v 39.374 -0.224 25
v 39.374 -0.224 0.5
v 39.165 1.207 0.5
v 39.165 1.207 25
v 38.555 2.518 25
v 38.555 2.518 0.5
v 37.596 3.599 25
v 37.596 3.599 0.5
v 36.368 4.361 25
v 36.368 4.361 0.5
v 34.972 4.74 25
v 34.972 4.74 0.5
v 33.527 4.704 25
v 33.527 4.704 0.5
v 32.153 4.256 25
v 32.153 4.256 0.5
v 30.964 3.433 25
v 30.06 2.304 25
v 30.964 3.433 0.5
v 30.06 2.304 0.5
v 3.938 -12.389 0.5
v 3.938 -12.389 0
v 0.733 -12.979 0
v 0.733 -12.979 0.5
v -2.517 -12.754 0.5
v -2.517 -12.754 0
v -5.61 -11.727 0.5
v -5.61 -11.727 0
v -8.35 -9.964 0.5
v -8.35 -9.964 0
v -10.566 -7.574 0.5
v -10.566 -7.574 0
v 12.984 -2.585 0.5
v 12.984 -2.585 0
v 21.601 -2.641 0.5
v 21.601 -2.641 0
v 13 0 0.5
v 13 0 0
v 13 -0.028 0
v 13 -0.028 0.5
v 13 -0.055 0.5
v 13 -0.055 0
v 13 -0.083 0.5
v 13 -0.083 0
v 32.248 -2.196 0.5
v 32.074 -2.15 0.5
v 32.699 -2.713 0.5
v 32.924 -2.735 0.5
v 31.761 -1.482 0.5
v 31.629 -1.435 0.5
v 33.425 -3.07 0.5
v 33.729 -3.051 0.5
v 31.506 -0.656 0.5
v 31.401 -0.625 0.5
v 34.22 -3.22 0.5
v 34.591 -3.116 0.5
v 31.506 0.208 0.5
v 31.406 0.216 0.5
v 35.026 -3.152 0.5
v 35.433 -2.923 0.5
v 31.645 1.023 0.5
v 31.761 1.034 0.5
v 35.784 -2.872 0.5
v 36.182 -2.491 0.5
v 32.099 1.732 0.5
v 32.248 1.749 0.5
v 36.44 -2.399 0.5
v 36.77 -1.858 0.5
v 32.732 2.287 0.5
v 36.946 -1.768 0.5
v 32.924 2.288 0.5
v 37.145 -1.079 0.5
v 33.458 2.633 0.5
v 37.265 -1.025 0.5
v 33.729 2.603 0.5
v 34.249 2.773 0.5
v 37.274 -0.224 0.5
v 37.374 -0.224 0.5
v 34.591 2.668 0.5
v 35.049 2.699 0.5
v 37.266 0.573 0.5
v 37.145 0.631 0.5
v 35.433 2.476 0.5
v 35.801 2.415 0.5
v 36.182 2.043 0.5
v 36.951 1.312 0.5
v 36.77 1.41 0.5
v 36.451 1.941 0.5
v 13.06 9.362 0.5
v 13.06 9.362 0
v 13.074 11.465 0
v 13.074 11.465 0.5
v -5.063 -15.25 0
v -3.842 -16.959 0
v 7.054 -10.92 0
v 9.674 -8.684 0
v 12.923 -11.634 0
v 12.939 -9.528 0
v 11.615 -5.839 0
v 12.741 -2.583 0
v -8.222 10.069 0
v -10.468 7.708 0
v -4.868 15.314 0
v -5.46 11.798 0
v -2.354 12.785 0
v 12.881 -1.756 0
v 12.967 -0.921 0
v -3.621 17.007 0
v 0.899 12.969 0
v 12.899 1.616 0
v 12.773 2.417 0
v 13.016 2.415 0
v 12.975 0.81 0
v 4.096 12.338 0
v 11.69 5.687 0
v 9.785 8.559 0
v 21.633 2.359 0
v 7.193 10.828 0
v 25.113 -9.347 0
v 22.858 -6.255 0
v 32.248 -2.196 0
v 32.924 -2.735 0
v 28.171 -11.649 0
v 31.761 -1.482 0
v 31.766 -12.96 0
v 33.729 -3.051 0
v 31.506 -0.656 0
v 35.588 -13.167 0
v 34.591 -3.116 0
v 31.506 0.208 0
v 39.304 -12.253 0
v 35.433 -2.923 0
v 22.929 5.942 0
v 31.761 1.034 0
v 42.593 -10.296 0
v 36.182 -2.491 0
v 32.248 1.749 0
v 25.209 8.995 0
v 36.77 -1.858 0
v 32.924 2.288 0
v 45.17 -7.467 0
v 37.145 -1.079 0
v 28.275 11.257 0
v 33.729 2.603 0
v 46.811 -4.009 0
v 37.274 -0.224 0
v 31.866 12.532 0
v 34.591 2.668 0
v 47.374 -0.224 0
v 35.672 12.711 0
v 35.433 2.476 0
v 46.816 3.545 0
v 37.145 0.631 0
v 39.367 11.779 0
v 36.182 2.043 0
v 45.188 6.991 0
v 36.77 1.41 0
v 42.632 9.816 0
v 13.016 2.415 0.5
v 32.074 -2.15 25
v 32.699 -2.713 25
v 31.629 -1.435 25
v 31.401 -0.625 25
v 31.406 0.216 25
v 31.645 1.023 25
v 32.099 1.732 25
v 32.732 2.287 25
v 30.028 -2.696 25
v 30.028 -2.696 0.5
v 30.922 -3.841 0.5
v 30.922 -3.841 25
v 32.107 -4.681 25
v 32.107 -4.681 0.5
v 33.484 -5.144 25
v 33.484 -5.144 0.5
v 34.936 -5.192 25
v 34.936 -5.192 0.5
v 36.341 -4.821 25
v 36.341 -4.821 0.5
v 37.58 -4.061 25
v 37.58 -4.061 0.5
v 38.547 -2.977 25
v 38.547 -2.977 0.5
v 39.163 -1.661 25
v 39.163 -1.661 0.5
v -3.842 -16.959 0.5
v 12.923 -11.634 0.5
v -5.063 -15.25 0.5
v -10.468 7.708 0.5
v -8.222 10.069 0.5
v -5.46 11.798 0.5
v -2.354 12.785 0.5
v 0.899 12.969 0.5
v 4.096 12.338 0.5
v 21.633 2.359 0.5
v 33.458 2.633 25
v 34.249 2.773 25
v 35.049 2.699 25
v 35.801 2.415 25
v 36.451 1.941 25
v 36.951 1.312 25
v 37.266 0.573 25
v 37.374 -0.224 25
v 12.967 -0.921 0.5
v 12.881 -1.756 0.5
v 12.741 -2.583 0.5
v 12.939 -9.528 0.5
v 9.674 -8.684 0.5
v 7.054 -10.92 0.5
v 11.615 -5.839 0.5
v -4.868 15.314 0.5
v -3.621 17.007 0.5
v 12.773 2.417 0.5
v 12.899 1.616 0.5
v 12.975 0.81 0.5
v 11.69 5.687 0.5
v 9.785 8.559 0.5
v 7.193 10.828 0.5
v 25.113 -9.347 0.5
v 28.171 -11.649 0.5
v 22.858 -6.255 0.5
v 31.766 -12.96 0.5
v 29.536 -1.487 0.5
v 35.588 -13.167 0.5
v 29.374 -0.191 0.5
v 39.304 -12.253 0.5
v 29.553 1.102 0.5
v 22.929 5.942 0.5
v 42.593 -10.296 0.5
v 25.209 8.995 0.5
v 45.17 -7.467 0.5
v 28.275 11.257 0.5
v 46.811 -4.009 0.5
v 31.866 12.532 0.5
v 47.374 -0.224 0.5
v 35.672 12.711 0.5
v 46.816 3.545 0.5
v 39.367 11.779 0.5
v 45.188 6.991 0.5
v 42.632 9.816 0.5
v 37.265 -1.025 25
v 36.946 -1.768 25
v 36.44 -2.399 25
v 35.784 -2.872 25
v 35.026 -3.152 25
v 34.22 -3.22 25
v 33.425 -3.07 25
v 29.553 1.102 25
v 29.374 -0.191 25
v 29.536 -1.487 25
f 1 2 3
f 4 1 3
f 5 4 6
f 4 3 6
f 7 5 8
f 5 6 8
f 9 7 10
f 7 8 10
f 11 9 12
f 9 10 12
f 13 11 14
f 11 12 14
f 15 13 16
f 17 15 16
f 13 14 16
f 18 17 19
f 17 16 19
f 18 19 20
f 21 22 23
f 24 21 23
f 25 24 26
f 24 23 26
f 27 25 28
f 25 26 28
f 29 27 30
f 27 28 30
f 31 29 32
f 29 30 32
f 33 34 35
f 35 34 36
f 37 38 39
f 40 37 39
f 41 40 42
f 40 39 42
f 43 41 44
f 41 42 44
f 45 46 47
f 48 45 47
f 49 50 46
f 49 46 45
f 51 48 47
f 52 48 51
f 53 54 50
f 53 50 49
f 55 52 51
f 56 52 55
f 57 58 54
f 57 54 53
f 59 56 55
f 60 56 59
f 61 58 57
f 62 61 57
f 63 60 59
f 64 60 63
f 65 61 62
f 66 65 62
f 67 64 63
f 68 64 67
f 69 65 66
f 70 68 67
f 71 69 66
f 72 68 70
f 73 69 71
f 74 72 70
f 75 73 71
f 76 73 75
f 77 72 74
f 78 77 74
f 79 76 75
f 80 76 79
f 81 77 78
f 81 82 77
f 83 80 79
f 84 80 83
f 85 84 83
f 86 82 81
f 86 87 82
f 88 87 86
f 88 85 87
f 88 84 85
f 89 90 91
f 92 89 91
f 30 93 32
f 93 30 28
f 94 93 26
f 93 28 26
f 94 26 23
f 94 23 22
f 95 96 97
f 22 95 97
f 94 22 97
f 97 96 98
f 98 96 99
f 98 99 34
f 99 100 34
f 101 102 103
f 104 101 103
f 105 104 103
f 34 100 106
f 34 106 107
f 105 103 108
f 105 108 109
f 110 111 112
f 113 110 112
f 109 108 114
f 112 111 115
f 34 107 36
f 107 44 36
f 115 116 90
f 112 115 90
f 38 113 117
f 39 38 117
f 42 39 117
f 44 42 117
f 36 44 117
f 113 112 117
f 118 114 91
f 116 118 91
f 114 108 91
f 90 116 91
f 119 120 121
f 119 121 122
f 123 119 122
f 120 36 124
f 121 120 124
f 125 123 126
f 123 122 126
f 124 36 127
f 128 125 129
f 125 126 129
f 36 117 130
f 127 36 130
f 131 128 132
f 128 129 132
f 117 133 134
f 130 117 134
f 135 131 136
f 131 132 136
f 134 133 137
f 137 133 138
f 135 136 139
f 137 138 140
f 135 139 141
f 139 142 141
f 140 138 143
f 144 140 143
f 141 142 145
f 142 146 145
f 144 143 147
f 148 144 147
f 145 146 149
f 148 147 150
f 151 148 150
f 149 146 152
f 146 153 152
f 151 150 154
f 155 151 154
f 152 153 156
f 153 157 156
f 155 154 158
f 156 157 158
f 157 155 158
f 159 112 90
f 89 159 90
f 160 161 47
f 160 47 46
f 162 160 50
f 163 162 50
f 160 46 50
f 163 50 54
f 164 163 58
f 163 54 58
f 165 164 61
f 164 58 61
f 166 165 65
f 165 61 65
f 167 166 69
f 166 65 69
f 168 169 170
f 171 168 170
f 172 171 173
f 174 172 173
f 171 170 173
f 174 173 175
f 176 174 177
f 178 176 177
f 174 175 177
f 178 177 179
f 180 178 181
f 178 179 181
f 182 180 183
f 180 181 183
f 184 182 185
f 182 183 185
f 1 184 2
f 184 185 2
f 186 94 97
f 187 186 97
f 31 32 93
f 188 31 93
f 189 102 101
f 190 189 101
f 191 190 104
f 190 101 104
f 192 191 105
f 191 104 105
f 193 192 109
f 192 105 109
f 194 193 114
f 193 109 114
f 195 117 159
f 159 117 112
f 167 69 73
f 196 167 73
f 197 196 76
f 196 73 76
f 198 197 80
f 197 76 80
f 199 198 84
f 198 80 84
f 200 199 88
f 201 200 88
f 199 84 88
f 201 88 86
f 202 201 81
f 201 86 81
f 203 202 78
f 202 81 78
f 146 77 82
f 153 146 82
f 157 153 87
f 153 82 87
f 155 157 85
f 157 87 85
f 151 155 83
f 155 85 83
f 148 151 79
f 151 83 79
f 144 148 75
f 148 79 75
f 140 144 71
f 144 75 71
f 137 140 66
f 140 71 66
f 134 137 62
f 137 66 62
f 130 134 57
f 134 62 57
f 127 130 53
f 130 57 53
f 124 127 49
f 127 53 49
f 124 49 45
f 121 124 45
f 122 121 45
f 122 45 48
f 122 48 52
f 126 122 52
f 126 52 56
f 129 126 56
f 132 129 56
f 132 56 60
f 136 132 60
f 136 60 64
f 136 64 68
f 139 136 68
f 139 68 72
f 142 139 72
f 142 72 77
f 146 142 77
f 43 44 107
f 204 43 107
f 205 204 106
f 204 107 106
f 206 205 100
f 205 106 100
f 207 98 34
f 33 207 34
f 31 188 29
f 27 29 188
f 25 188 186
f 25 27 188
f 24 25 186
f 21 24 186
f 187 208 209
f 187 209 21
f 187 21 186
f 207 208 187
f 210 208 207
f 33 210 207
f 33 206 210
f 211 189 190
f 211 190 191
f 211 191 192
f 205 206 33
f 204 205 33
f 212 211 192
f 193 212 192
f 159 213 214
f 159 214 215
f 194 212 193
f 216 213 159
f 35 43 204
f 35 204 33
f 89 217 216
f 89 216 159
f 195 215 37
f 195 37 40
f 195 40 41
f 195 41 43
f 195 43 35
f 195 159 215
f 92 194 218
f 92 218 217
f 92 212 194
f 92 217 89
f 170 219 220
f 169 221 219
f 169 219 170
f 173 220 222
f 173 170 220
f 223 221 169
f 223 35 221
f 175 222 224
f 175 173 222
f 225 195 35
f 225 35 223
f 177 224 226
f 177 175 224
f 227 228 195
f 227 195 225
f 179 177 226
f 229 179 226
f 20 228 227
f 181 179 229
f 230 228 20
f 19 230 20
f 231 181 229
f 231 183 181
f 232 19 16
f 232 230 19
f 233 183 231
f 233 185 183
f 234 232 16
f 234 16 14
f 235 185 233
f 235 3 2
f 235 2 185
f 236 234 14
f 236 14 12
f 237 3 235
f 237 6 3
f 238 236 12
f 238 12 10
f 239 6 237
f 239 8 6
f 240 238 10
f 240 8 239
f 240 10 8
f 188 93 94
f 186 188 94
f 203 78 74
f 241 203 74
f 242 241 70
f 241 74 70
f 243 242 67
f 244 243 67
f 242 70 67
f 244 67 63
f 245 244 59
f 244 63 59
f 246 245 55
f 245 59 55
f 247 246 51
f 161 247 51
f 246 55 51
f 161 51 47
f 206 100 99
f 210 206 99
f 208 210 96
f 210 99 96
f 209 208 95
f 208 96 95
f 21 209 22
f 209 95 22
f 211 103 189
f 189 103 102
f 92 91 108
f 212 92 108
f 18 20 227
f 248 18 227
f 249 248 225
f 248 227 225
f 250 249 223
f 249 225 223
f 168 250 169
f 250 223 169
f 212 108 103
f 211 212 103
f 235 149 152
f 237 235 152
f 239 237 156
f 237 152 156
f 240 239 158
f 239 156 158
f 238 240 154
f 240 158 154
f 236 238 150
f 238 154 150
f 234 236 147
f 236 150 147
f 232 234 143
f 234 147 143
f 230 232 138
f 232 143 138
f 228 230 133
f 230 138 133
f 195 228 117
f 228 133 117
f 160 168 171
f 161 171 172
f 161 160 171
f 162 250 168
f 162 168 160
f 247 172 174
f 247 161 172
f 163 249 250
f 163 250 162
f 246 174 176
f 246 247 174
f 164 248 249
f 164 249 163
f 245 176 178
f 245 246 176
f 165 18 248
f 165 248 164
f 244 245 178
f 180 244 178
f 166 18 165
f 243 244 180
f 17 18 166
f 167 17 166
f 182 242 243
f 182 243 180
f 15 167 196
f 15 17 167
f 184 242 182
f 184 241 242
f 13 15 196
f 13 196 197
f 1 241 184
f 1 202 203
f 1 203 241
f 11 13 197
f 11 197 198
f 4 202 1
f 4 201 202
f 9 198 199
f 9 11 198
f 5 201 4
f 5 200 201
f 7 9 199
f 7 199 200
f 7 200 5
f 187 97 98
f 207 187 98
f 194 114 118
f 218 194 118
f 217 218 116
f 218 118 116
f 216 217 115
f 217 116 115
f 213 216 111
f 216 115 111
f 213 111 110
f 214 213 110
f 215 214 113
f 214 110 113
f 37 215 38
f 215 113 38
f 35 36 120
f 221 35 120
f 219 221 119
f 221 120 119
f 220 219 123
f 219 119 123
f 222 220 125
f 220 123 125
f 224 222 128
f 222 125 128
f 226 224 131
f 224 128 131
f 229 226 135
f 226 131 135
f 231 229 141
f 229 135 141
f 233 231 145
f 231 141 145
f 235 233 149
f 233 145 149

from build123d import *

# Parameters (mm, degrees)
F1_DEPTH = 0.5
F2_DEPTH = 25
F3_R     = 2.9
F4_DEPTH = 0.501
F6_DEPTH = 0.5


# Not quite as in the source:
# - a feature names something its author has since deleted; it is built from what else it names


with BuildPart() as f1:
    # F0 (on Top) → F1 (new body)
    with BuildSketch(Plane.XY):
        with BuildLine():
            Line((4.0961373656, 12.3378141776), (-4.8678095704, 15.3138321001))
            Line((-4.8678095704, 15.3138321001), (-10.4681826882, 7.7082521499))
            ThreePointArc((-10.4681826882, 7.7082521499), (-3.9381406197, 12.3891504333), (4.0961373656, 12.3378141776))
        make_face()
    extrude(amount=F1_DEPTH)



with BuildPart() as f1b:
    # F0 (on Top) → F1, piece 2 (new body)
    with BuildSketch(Plane.XY):
        with BuildLine():
            Line((13.0600839256, 9.36179638), (4.0961373656, 12.3378141776))
            ThreePointArc((4.0961373656, 12.3378141776), (9.7852826172, 8.5585188031), (12.7733744664, 2.41679638))
            Line((12.7733744664, 2.41679638), (13.01569776, 2.4152179267))
            Line((13.01569776, 2.4152179267), (13.0600839256, 9.36179638))
        make_face()
        with BuildLine():
            Line((13.01569776, 2.4152179267), (12.7733744664, 2.41679638))
            ThreePointArc((12.7733744664, 2.41679638), (12.9432196161, 1.2136992909), (13, 0))
            ThreePointArc((13, 0), (12.9999336569, -0.0415321088), (12.9997346283, -0.0830637936))
            Line((12.9997346283, -0.0830637936), (13.01569776, 2.4152179267))
        make_face()
        with BuildLine():
            Line((21.6332001204, 2.3590849609), (13.01569776, 2.4152179267))
            Line((13.01569776, 2.4152179267), (12.9997346283, -0.0830637936))
            Line((12.9997346283, -0.0830637936), (12.9837495259, -2.5847840032))
            Line((12.9837495259, -2.5847840032), (21.6006561013, -2.640828477))
            ThreePointArc((21.6006561013, -2.640828477), (21.374282177, -0.1392923959), (21.6332001204, 2.3590849609))
        make_face()
        with BuildLine():
            ThreePointArc((12.7407636764, -2.58320362), (9.6739656437, -8.6841458259), (3.9381407553, -12.3891503902))
            Line((3.9381407553, -12.3891503902), (12.9393853324, -9.5279237416))
            Line((12.9393853324, -9.5279237416), (12.9837495259, -2.5847840032))
            Line((12.9837495259, -2.5847840032), (12.7407636764, -2.58320362))
        make_face()
        with BuildLine():
            Line((12.9837495259, -2.5847840032), (12.9997346283, -0.0830637936))
            ThreePointArc((12.9997346283, -0.0830637936), (12.9308154434, -1.3394073199), (12.7407636764, -2.58320362))
            Line((12.7407636764, -2.58320362), (12.9837495259, -2.5847840032))
        make_face()
        with BuildLine():
            ThreePointArc((47.3740068068, -0.2239065181), (35.6719885241, 12.7111328503), (21.6332001204, 2.3590849609))
            Line((21.6332001204, 2.3590849609), (30.0602249194, 2.304192734))
            ThreePointArc((30.0602249194, 2.304192734), (35.6837950651, 4.6014903276), (39.3740068068, -0.2239065181))
            ThreePointArc((39.3740068068, -0.2239065181), (35.6523599398, -5.0577262569), (30.0276814999, -2.6956379611))
            Line((30.0276814999, -2.6956379611), (21.6006561013, -2.640828477))
            ThreePointArc((21.6006561013, -2.640828477), (35.5877697221, -13.1671201679), (47.3740068068, -0.2239065181))
        make_face()
        with BuildLine():
            Line((30.0602249194, 2.304192734), (21.6332001204, 2.3590849609))
            ThreePointArc((21.6332001204, 2.3590849609), (21.374282177, -0.1392923959), (21.6006561013, -2.640828477))
            Line((21.6006561013, -2.640828477), (30.0276814999, -2.6956379611))
            ThreePointArc((30.0276814999, -2.6956379611), (29.374112718, -0.1913626859), (30.0602249194, 2.304192734))
        make_face()
        with BuildLine():
            Line((32.7319335315, 2.286789672), (30.0602249194, 2.304192734))
            ThreePointArc((30.0602249194, 2.304192734), (29.374112718, -0.1913626859), (30.0276814999, -2.6956379611))
            Line((30.0276814999, -2.6956379611), (32.6993904313, -2.7130147911))
            ThreePointArc((32.6993904313, -2.7130147911), (31.3740703529, -0.2043803079), (32.7319335315, 2.286789672))
        make_face()
        with BuildLine():
            ThreePointArc((37.3740068068, -0.2239065181), (35.80120339, 2.4148640125), (32.7319335315, 2.286789672))
            Line((32.7319335315, 2.286789672), (34.3740068068, 2.2760934819))
            Line((34.3740068068, 2.2760934819), (34.3740068068, -2.7239065181))
            Line((34.3740068068, -2.7239065181), (32.6993904313, -2.7130147911))
            ThreePointArc((32.6993904313, -2.7130147911), (35.7839980964, -2.8719104009), (37.3740068068, -0.2239065181))
        make_face()
        with BuildLine():
            Line((34.3740068068, 2.2760934819), (32.7319335315, 2.286789672))
            ThreePointArc((32.7319335315, 2.286789672), (31.3740703529, -0.2043803079), (32.6993904313, -2.7130147911))
            Line((32.6993904313, -2.7130147911), (34.3740068068, -2.7239065181))
            Line((34.3740068068, -2.7239065181), (34.3740068068, 2.2760934819))
        make_face()
    extrude(amount=F1_DEPTH)

    # F0 (on Top) → F2 (join)
    with BuildSketch(Plane.XY):
        with BuildLine():
            ThreePointArc((39.3740068068, -0.2239065181), (35.6837950651, 4.6014903276), (30.0602249194, 2.304192734))
            Line((30.0602249194, 2.304192734), (32.7319335315, 2.286789672))
            ThreePointArc((32.7319335315, 2.286789672), (35.80120339, 2.4148640125), (37.3740068068, -0.2239065181))
            ThreePointArc((37.3740068068, -0.2239065181), (35.7839980964, -2.8719104009), (32.6993904313, -2.7130147911))
            Line((32.6993904313, -2.7130147911), (30.0276814999, -2.6956379611))
            ThreePointArc((30.0276814999, -2.6956379611), (35.6523599398, -5.0577262569), (39.3740068068, -0.2239065181))
        make_face()
        with BuildLine():
            Line((32.7319335315, 2.286789672), (30.0602249194, 2.304192734))
            ThreePointArc((30.0602249194, 2.304192734), (29.374112718, -0.1913626859), (30.0276814999, -2.6956379611))
            Line((30.0276814999, -2.6956379611), (32.6993904313, -2.7130147911))
            ThreePointArc((32.6993904313, -2.7130147911), (31.3740703529, -0.2043803079), (32.7319335315, 2.286789672))
        make_face()
    extrude(amount=F2_DEPTH)

    # F3 (on face) → F4 (cut, through all)
    with BuildSketch(Plane.XY.offset(0.5)):
        with Locations((34.3740068068, -0.2239065181)):
            Circle(F3_R)
    extrude(amount=-F4_DEPTH, mode=Mode.SUBTRACT)


with BuildPart() as f1c:
    # F0 (on Top) → F1, piece 3 (new body)
    with BuildSketch(Plane.XY):
        with BuildLine():
            ThreePointArc((3.9381407553, -12.3891503902), (-4.096137147, -12.3378142502), (-10.5658298597, -7.5738523471))
            Line((-10.5658298597, -7.5738523471), (-5.0631039967, -15.2503770945))
            Line((-5.0631039967, -15.2503770945), (3.9381407553, -12.3891503902))
        make_face()
    extrude(amount=F1_DEPTH)


with BuildPart() as f1_1:
    add(f1.part)

    add(f1b.part)  # F6 merges F1b

    add(f1c.part)  # F6 merges F1c
    # F5 (on face) → F6 (join, through all)
    with BuildSketch(Plane.XY):
        Polygon((-4.8678095704, 15.3138321001), (4.0961371776, 12.3378142401), (13.0600839256, 9.36179638), (13.0735205907, 11.4646779011), (-3.6208963346, 17.0072011144), align=None)
        Polygon((-5.0631039967, -15.2503770945), (-3.8421437919, -16.9585881221), (12.9230595755, -11.6340152664), (12.9393853324, -9.5279237416), (3.9381406679, -12.389150418), align=None)
    extrude(amount=F6_DEPTH)


solid = f1_1.part
